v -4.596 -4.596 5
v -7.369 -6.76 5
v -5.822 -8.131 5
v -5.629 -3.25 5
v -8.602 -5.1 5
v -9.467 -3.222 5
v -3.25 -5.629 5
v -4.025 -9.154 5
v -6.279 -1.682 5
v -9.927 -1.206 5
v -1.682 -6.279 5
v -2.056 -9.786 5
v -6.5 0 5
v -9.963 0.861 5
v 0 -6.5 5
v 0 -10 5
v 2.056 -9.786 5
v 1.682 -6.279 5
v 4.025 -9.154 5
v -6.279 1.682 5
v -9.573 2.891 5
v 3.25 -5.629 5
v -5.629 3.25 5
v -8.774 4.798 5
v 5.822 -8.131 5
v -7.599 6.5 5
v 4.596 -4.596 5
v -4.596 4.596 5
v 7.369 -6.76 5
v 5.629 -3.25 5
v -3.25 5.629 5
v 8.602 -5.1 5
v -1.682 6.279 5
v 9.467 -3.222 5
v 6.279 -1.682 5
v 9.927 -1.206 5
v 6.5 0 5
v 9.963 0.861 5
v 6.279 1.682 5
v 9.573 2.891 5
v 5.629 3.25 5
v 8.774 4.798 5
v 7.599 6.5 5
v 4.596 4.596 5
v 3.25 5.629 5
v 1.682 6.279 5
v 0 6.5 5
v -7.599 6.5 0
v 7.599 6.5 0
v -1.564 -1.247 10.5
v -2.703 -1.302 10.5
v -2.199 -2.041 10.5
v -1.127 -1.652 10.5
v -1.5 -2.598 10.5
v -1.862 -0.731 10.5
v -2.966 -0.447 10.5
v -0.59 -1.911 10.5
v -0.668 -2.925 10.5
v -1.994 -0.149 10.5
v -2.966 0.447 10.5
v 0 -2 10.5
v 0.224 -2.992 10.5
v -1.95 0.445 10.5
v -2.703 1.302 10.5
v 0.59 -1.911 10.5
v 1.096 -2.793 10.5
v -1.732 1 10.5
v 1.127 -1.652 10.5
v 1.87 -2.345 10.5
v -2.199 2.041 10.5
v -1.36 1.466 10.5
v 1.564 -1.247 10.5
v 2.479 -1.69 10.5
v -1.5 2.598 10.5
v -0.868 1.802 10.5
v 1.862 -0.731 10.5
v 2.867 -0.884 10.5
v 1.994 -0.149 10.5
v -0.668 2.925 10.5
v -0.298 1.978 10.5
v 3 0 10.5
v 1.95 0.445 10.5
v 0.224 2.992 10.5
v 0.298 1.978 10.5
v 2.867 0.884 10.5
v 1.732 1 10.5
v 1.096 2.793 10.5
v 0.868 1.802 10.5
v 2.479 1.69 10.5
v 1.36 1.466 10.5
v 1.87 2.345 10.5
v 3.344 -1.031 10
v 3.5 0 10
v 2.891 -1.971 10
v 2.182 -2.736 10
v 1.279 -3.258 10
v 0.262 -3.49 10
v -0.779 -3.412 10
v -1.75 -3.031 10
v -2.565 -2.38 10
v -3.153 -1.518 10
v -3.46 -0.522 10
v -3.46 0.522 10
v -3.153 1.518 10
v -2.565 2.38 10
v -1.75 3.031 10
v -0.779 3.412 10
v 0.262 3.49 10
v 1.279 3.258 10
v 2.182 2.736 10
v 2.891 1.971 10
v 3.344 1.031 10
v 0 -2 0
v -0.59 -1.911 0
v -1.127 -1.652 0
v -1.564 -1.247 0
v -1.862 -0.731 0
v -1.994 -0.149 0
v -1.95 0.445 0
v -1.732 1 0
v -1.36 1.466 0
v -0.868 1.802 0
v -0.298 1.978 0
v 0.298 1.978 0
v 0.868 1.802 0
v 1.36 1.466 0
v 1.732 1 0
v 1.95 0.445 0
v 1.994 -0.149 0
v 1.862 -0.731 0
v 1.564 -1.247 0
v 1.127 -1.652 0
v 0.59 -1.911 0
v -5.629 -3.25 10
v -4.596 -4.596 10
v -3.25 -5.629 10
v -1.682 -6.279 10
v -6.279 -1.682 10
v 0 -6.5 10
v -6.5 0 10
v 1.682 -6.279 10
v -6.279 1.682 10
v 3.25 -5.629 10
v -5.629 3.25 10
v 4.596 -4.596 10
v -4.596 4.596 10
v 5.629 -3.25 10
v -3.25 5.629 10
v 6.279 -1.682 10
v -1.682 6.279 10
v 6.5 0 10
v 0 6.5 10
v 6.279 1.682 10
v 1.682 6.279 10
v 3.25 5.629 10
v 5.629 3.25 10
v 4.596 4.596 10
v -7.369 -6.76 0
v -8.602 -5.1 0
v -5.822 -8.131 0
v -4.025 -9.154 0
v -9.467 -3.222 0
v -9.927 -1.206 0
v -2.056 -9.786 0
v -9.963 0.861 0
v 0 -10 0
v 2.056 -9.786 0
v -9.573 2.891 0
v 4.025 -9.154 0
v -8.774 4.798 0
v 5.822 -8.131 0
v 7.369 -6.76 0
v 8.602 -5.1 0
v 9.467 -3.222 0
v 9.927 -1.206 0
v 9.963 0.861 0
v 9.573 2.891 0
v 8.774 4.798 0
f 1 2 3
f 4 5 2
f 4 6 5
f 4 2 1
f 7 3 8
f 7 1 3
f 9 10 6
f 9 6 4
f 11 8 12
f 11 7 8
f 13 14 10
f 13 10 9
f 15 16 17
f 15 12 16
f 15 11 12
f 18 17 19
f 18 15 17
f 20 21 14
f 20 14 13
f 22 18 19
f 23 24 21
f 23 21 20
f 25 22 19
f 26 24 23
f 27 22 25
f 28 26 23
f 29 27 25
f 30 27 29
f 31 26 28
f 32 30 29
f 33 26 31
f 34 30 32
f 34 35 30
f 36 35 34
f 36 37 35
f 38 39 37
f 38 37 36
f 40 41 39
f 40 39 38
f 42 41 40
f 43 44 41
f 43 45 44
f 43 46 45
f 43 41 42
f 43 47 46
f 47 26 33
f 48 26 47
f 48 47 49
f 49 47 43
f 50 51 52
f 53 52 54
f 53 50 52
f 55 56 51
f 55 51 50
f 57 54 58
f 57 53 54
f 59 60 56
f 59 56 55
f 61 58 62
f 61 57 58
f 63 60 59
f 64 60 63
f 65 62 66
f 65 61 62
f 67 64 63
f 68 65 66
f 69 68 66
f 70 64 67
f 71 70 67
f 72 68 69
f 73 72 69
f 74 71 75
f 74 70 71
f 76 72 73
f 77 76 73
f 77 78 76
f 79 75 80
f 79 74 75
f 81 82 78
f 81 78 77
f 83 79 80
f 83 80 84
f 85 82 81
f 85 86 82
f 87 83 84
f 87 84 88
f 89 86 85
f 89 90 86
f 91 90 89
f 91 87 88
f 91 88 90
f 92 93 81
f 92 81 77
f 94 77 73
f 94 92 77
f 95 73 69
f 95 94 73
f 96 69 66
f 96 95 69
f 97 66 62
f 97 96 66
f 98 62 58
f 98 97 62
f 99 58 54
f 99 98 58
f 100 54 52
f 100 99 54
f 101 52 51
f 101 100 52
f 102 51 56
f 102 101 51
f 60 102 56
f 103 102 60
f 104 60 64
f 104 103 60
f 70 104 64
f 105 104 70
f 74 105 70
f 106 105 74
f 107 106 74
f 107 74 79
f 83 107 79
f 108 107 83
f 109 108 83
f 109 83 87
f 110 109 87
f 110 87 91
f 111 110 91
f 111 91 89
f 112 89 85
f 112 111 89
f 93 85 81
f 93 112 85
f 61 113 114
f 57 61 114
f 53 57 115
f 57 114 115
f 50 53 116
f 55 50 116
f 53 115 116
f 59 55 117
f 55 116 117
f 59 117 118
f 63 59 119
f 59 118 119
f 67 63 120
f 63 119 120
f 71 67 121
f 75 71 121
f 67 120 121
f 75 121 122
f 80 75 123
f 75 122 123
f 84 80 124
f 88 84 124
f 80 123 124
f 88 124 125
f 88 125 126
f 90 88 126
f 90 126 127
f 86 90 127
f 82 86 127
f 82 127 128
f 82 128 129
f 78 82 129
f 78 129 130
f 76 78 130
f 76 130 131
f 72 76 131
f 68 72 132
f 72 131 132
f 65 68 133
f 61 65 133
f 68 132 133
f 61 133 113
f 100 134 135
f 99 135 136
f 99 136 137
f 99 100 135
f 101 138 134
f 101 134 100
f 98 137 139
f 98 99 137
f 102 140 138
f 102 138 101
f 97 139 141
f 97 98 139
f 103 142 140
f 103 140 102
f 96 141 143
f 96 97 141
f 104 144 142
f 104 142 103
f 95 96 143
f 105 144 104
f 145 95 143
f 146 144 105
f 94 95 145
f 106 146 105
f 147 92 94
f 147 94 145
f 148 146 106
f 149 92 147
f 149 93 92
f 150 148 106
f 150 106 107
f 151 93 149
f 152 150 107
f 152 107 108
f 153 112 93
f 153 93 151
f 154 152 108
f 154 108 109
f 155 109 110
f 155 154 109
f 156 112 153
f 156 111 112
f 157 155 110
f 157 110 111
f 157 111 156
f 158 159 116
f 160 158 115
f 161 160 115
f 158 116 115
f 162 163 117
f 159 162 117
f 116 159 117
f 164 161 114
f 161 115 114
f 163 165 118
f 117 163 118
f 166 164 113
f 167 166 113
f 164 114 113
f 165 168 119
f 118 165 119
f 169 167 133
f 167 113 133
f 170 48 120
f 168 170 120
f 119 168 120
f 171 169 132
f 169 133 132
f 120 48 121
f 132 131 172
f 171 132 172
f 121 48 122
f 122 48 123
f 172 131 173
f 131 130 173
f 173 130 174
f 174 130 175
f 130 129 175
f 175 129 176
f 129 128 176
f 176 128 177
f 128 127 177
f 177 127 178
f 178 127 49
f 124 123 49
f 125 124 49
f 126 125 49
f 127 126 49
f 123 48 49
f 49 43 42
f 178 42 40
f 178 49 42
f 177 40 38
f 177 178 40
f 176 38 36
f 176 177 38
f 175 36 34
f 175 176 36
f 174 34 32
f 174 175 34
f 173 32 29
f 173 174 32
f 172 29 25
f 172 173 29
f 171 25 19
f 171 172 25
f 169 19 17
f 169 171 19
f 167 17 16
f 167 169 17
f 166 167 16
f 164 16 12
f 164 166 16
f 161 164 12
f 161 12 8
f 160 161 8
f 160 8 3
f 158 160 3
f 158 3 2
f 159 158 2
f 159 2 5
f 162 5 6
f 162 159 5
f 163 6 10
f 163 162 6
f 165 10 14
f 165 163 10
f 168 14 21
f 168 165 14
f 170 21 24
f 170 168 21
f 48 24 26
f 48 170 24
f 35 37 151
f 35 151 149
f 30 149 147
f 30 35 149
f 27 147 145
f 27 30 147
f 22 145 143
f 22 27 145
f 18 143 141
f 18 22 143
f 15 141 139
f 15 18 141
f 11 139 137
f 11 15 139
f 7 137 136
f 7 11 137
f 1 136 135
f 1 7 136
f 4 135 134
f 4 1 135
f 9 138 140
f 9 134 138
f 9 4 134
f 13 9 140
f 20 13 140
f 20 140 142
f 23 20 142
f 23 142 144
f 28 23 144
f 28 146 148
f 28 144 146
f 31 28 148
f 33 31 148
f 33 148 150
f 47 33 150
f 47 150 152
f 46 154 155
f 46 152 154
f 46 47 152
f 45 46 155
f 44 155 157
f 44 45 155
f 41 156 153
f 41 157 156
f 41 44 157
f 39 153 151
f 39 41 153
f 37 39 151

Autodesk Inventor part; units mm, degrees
ref_plane "YZ Plane" through (0, 0, 0) normal (1, 0, 0) x (0, 1, 0)
ref_plane "XZ Plane" through (0, 0, 0) normal (0, 1, 0) x (-1, 0, 0)
ref_plane "XY Plane" through (0, 0, 0) normal (0, 0, 1) x (1, 0, 0)
sketch "Skizze1" plane through (0, 0, 0) normal (0, 0, 1) x (1, 0, 0)
  circle A0 centre (0, 0) radius 10
  dimension "d0" = 20
extrude "Extrusion1" add sketch "Skizze1" along normal blind 5
sketch "Skizze2" plane through (0, 0, 5) normal (0, 0, 1) x (1, 0, 0)
  circle A0 centre (0, 0) radius 6.5
  dimension "d3" = 13
extrude "Extrusion2" add sketch "Skizze2" along normal blind 5
sketch "Skizze3" plane through (0, 0, 5) normal (0, 0, 1) x (1, 0, 0)
  circle A0 centre (0, 0) radius 6.5 projected
  circle A1 centre (0, 0) radius 10 projected
  line L0 (-7.5993, 6.5) -> (7.5993, 6.5)
extrude "Extrusion3" cut sketch "Skizze3" against normal through all contours L0 A1 picked at (4.4606, 7.0529)
sketch "Skizze4" plane through (0, 0, 10) normal (0, 0, 1) x (1, 0, 0)
  circle A0 centre (0, 0) radius 3
  dimension "d8" = 6
extrude "Extrusion4" add sketch "Skizze4" along normal blind 0.5
sketch "Skizze5" plane through (0, 0, 10.5) normal (0, 0, 1) x (1, 0, 0)
  point P0 (0, 0)
hole "Bohrung1" at (0, 0, 10.5) direction (0, 0, -1) diameter 4 end through all
chamfer "Fase1" distance 0.5 angle 45 1 edges at (-3, 0, 10)
properties part number "Belt_T_Spacer" material "Aluminium 6061"
